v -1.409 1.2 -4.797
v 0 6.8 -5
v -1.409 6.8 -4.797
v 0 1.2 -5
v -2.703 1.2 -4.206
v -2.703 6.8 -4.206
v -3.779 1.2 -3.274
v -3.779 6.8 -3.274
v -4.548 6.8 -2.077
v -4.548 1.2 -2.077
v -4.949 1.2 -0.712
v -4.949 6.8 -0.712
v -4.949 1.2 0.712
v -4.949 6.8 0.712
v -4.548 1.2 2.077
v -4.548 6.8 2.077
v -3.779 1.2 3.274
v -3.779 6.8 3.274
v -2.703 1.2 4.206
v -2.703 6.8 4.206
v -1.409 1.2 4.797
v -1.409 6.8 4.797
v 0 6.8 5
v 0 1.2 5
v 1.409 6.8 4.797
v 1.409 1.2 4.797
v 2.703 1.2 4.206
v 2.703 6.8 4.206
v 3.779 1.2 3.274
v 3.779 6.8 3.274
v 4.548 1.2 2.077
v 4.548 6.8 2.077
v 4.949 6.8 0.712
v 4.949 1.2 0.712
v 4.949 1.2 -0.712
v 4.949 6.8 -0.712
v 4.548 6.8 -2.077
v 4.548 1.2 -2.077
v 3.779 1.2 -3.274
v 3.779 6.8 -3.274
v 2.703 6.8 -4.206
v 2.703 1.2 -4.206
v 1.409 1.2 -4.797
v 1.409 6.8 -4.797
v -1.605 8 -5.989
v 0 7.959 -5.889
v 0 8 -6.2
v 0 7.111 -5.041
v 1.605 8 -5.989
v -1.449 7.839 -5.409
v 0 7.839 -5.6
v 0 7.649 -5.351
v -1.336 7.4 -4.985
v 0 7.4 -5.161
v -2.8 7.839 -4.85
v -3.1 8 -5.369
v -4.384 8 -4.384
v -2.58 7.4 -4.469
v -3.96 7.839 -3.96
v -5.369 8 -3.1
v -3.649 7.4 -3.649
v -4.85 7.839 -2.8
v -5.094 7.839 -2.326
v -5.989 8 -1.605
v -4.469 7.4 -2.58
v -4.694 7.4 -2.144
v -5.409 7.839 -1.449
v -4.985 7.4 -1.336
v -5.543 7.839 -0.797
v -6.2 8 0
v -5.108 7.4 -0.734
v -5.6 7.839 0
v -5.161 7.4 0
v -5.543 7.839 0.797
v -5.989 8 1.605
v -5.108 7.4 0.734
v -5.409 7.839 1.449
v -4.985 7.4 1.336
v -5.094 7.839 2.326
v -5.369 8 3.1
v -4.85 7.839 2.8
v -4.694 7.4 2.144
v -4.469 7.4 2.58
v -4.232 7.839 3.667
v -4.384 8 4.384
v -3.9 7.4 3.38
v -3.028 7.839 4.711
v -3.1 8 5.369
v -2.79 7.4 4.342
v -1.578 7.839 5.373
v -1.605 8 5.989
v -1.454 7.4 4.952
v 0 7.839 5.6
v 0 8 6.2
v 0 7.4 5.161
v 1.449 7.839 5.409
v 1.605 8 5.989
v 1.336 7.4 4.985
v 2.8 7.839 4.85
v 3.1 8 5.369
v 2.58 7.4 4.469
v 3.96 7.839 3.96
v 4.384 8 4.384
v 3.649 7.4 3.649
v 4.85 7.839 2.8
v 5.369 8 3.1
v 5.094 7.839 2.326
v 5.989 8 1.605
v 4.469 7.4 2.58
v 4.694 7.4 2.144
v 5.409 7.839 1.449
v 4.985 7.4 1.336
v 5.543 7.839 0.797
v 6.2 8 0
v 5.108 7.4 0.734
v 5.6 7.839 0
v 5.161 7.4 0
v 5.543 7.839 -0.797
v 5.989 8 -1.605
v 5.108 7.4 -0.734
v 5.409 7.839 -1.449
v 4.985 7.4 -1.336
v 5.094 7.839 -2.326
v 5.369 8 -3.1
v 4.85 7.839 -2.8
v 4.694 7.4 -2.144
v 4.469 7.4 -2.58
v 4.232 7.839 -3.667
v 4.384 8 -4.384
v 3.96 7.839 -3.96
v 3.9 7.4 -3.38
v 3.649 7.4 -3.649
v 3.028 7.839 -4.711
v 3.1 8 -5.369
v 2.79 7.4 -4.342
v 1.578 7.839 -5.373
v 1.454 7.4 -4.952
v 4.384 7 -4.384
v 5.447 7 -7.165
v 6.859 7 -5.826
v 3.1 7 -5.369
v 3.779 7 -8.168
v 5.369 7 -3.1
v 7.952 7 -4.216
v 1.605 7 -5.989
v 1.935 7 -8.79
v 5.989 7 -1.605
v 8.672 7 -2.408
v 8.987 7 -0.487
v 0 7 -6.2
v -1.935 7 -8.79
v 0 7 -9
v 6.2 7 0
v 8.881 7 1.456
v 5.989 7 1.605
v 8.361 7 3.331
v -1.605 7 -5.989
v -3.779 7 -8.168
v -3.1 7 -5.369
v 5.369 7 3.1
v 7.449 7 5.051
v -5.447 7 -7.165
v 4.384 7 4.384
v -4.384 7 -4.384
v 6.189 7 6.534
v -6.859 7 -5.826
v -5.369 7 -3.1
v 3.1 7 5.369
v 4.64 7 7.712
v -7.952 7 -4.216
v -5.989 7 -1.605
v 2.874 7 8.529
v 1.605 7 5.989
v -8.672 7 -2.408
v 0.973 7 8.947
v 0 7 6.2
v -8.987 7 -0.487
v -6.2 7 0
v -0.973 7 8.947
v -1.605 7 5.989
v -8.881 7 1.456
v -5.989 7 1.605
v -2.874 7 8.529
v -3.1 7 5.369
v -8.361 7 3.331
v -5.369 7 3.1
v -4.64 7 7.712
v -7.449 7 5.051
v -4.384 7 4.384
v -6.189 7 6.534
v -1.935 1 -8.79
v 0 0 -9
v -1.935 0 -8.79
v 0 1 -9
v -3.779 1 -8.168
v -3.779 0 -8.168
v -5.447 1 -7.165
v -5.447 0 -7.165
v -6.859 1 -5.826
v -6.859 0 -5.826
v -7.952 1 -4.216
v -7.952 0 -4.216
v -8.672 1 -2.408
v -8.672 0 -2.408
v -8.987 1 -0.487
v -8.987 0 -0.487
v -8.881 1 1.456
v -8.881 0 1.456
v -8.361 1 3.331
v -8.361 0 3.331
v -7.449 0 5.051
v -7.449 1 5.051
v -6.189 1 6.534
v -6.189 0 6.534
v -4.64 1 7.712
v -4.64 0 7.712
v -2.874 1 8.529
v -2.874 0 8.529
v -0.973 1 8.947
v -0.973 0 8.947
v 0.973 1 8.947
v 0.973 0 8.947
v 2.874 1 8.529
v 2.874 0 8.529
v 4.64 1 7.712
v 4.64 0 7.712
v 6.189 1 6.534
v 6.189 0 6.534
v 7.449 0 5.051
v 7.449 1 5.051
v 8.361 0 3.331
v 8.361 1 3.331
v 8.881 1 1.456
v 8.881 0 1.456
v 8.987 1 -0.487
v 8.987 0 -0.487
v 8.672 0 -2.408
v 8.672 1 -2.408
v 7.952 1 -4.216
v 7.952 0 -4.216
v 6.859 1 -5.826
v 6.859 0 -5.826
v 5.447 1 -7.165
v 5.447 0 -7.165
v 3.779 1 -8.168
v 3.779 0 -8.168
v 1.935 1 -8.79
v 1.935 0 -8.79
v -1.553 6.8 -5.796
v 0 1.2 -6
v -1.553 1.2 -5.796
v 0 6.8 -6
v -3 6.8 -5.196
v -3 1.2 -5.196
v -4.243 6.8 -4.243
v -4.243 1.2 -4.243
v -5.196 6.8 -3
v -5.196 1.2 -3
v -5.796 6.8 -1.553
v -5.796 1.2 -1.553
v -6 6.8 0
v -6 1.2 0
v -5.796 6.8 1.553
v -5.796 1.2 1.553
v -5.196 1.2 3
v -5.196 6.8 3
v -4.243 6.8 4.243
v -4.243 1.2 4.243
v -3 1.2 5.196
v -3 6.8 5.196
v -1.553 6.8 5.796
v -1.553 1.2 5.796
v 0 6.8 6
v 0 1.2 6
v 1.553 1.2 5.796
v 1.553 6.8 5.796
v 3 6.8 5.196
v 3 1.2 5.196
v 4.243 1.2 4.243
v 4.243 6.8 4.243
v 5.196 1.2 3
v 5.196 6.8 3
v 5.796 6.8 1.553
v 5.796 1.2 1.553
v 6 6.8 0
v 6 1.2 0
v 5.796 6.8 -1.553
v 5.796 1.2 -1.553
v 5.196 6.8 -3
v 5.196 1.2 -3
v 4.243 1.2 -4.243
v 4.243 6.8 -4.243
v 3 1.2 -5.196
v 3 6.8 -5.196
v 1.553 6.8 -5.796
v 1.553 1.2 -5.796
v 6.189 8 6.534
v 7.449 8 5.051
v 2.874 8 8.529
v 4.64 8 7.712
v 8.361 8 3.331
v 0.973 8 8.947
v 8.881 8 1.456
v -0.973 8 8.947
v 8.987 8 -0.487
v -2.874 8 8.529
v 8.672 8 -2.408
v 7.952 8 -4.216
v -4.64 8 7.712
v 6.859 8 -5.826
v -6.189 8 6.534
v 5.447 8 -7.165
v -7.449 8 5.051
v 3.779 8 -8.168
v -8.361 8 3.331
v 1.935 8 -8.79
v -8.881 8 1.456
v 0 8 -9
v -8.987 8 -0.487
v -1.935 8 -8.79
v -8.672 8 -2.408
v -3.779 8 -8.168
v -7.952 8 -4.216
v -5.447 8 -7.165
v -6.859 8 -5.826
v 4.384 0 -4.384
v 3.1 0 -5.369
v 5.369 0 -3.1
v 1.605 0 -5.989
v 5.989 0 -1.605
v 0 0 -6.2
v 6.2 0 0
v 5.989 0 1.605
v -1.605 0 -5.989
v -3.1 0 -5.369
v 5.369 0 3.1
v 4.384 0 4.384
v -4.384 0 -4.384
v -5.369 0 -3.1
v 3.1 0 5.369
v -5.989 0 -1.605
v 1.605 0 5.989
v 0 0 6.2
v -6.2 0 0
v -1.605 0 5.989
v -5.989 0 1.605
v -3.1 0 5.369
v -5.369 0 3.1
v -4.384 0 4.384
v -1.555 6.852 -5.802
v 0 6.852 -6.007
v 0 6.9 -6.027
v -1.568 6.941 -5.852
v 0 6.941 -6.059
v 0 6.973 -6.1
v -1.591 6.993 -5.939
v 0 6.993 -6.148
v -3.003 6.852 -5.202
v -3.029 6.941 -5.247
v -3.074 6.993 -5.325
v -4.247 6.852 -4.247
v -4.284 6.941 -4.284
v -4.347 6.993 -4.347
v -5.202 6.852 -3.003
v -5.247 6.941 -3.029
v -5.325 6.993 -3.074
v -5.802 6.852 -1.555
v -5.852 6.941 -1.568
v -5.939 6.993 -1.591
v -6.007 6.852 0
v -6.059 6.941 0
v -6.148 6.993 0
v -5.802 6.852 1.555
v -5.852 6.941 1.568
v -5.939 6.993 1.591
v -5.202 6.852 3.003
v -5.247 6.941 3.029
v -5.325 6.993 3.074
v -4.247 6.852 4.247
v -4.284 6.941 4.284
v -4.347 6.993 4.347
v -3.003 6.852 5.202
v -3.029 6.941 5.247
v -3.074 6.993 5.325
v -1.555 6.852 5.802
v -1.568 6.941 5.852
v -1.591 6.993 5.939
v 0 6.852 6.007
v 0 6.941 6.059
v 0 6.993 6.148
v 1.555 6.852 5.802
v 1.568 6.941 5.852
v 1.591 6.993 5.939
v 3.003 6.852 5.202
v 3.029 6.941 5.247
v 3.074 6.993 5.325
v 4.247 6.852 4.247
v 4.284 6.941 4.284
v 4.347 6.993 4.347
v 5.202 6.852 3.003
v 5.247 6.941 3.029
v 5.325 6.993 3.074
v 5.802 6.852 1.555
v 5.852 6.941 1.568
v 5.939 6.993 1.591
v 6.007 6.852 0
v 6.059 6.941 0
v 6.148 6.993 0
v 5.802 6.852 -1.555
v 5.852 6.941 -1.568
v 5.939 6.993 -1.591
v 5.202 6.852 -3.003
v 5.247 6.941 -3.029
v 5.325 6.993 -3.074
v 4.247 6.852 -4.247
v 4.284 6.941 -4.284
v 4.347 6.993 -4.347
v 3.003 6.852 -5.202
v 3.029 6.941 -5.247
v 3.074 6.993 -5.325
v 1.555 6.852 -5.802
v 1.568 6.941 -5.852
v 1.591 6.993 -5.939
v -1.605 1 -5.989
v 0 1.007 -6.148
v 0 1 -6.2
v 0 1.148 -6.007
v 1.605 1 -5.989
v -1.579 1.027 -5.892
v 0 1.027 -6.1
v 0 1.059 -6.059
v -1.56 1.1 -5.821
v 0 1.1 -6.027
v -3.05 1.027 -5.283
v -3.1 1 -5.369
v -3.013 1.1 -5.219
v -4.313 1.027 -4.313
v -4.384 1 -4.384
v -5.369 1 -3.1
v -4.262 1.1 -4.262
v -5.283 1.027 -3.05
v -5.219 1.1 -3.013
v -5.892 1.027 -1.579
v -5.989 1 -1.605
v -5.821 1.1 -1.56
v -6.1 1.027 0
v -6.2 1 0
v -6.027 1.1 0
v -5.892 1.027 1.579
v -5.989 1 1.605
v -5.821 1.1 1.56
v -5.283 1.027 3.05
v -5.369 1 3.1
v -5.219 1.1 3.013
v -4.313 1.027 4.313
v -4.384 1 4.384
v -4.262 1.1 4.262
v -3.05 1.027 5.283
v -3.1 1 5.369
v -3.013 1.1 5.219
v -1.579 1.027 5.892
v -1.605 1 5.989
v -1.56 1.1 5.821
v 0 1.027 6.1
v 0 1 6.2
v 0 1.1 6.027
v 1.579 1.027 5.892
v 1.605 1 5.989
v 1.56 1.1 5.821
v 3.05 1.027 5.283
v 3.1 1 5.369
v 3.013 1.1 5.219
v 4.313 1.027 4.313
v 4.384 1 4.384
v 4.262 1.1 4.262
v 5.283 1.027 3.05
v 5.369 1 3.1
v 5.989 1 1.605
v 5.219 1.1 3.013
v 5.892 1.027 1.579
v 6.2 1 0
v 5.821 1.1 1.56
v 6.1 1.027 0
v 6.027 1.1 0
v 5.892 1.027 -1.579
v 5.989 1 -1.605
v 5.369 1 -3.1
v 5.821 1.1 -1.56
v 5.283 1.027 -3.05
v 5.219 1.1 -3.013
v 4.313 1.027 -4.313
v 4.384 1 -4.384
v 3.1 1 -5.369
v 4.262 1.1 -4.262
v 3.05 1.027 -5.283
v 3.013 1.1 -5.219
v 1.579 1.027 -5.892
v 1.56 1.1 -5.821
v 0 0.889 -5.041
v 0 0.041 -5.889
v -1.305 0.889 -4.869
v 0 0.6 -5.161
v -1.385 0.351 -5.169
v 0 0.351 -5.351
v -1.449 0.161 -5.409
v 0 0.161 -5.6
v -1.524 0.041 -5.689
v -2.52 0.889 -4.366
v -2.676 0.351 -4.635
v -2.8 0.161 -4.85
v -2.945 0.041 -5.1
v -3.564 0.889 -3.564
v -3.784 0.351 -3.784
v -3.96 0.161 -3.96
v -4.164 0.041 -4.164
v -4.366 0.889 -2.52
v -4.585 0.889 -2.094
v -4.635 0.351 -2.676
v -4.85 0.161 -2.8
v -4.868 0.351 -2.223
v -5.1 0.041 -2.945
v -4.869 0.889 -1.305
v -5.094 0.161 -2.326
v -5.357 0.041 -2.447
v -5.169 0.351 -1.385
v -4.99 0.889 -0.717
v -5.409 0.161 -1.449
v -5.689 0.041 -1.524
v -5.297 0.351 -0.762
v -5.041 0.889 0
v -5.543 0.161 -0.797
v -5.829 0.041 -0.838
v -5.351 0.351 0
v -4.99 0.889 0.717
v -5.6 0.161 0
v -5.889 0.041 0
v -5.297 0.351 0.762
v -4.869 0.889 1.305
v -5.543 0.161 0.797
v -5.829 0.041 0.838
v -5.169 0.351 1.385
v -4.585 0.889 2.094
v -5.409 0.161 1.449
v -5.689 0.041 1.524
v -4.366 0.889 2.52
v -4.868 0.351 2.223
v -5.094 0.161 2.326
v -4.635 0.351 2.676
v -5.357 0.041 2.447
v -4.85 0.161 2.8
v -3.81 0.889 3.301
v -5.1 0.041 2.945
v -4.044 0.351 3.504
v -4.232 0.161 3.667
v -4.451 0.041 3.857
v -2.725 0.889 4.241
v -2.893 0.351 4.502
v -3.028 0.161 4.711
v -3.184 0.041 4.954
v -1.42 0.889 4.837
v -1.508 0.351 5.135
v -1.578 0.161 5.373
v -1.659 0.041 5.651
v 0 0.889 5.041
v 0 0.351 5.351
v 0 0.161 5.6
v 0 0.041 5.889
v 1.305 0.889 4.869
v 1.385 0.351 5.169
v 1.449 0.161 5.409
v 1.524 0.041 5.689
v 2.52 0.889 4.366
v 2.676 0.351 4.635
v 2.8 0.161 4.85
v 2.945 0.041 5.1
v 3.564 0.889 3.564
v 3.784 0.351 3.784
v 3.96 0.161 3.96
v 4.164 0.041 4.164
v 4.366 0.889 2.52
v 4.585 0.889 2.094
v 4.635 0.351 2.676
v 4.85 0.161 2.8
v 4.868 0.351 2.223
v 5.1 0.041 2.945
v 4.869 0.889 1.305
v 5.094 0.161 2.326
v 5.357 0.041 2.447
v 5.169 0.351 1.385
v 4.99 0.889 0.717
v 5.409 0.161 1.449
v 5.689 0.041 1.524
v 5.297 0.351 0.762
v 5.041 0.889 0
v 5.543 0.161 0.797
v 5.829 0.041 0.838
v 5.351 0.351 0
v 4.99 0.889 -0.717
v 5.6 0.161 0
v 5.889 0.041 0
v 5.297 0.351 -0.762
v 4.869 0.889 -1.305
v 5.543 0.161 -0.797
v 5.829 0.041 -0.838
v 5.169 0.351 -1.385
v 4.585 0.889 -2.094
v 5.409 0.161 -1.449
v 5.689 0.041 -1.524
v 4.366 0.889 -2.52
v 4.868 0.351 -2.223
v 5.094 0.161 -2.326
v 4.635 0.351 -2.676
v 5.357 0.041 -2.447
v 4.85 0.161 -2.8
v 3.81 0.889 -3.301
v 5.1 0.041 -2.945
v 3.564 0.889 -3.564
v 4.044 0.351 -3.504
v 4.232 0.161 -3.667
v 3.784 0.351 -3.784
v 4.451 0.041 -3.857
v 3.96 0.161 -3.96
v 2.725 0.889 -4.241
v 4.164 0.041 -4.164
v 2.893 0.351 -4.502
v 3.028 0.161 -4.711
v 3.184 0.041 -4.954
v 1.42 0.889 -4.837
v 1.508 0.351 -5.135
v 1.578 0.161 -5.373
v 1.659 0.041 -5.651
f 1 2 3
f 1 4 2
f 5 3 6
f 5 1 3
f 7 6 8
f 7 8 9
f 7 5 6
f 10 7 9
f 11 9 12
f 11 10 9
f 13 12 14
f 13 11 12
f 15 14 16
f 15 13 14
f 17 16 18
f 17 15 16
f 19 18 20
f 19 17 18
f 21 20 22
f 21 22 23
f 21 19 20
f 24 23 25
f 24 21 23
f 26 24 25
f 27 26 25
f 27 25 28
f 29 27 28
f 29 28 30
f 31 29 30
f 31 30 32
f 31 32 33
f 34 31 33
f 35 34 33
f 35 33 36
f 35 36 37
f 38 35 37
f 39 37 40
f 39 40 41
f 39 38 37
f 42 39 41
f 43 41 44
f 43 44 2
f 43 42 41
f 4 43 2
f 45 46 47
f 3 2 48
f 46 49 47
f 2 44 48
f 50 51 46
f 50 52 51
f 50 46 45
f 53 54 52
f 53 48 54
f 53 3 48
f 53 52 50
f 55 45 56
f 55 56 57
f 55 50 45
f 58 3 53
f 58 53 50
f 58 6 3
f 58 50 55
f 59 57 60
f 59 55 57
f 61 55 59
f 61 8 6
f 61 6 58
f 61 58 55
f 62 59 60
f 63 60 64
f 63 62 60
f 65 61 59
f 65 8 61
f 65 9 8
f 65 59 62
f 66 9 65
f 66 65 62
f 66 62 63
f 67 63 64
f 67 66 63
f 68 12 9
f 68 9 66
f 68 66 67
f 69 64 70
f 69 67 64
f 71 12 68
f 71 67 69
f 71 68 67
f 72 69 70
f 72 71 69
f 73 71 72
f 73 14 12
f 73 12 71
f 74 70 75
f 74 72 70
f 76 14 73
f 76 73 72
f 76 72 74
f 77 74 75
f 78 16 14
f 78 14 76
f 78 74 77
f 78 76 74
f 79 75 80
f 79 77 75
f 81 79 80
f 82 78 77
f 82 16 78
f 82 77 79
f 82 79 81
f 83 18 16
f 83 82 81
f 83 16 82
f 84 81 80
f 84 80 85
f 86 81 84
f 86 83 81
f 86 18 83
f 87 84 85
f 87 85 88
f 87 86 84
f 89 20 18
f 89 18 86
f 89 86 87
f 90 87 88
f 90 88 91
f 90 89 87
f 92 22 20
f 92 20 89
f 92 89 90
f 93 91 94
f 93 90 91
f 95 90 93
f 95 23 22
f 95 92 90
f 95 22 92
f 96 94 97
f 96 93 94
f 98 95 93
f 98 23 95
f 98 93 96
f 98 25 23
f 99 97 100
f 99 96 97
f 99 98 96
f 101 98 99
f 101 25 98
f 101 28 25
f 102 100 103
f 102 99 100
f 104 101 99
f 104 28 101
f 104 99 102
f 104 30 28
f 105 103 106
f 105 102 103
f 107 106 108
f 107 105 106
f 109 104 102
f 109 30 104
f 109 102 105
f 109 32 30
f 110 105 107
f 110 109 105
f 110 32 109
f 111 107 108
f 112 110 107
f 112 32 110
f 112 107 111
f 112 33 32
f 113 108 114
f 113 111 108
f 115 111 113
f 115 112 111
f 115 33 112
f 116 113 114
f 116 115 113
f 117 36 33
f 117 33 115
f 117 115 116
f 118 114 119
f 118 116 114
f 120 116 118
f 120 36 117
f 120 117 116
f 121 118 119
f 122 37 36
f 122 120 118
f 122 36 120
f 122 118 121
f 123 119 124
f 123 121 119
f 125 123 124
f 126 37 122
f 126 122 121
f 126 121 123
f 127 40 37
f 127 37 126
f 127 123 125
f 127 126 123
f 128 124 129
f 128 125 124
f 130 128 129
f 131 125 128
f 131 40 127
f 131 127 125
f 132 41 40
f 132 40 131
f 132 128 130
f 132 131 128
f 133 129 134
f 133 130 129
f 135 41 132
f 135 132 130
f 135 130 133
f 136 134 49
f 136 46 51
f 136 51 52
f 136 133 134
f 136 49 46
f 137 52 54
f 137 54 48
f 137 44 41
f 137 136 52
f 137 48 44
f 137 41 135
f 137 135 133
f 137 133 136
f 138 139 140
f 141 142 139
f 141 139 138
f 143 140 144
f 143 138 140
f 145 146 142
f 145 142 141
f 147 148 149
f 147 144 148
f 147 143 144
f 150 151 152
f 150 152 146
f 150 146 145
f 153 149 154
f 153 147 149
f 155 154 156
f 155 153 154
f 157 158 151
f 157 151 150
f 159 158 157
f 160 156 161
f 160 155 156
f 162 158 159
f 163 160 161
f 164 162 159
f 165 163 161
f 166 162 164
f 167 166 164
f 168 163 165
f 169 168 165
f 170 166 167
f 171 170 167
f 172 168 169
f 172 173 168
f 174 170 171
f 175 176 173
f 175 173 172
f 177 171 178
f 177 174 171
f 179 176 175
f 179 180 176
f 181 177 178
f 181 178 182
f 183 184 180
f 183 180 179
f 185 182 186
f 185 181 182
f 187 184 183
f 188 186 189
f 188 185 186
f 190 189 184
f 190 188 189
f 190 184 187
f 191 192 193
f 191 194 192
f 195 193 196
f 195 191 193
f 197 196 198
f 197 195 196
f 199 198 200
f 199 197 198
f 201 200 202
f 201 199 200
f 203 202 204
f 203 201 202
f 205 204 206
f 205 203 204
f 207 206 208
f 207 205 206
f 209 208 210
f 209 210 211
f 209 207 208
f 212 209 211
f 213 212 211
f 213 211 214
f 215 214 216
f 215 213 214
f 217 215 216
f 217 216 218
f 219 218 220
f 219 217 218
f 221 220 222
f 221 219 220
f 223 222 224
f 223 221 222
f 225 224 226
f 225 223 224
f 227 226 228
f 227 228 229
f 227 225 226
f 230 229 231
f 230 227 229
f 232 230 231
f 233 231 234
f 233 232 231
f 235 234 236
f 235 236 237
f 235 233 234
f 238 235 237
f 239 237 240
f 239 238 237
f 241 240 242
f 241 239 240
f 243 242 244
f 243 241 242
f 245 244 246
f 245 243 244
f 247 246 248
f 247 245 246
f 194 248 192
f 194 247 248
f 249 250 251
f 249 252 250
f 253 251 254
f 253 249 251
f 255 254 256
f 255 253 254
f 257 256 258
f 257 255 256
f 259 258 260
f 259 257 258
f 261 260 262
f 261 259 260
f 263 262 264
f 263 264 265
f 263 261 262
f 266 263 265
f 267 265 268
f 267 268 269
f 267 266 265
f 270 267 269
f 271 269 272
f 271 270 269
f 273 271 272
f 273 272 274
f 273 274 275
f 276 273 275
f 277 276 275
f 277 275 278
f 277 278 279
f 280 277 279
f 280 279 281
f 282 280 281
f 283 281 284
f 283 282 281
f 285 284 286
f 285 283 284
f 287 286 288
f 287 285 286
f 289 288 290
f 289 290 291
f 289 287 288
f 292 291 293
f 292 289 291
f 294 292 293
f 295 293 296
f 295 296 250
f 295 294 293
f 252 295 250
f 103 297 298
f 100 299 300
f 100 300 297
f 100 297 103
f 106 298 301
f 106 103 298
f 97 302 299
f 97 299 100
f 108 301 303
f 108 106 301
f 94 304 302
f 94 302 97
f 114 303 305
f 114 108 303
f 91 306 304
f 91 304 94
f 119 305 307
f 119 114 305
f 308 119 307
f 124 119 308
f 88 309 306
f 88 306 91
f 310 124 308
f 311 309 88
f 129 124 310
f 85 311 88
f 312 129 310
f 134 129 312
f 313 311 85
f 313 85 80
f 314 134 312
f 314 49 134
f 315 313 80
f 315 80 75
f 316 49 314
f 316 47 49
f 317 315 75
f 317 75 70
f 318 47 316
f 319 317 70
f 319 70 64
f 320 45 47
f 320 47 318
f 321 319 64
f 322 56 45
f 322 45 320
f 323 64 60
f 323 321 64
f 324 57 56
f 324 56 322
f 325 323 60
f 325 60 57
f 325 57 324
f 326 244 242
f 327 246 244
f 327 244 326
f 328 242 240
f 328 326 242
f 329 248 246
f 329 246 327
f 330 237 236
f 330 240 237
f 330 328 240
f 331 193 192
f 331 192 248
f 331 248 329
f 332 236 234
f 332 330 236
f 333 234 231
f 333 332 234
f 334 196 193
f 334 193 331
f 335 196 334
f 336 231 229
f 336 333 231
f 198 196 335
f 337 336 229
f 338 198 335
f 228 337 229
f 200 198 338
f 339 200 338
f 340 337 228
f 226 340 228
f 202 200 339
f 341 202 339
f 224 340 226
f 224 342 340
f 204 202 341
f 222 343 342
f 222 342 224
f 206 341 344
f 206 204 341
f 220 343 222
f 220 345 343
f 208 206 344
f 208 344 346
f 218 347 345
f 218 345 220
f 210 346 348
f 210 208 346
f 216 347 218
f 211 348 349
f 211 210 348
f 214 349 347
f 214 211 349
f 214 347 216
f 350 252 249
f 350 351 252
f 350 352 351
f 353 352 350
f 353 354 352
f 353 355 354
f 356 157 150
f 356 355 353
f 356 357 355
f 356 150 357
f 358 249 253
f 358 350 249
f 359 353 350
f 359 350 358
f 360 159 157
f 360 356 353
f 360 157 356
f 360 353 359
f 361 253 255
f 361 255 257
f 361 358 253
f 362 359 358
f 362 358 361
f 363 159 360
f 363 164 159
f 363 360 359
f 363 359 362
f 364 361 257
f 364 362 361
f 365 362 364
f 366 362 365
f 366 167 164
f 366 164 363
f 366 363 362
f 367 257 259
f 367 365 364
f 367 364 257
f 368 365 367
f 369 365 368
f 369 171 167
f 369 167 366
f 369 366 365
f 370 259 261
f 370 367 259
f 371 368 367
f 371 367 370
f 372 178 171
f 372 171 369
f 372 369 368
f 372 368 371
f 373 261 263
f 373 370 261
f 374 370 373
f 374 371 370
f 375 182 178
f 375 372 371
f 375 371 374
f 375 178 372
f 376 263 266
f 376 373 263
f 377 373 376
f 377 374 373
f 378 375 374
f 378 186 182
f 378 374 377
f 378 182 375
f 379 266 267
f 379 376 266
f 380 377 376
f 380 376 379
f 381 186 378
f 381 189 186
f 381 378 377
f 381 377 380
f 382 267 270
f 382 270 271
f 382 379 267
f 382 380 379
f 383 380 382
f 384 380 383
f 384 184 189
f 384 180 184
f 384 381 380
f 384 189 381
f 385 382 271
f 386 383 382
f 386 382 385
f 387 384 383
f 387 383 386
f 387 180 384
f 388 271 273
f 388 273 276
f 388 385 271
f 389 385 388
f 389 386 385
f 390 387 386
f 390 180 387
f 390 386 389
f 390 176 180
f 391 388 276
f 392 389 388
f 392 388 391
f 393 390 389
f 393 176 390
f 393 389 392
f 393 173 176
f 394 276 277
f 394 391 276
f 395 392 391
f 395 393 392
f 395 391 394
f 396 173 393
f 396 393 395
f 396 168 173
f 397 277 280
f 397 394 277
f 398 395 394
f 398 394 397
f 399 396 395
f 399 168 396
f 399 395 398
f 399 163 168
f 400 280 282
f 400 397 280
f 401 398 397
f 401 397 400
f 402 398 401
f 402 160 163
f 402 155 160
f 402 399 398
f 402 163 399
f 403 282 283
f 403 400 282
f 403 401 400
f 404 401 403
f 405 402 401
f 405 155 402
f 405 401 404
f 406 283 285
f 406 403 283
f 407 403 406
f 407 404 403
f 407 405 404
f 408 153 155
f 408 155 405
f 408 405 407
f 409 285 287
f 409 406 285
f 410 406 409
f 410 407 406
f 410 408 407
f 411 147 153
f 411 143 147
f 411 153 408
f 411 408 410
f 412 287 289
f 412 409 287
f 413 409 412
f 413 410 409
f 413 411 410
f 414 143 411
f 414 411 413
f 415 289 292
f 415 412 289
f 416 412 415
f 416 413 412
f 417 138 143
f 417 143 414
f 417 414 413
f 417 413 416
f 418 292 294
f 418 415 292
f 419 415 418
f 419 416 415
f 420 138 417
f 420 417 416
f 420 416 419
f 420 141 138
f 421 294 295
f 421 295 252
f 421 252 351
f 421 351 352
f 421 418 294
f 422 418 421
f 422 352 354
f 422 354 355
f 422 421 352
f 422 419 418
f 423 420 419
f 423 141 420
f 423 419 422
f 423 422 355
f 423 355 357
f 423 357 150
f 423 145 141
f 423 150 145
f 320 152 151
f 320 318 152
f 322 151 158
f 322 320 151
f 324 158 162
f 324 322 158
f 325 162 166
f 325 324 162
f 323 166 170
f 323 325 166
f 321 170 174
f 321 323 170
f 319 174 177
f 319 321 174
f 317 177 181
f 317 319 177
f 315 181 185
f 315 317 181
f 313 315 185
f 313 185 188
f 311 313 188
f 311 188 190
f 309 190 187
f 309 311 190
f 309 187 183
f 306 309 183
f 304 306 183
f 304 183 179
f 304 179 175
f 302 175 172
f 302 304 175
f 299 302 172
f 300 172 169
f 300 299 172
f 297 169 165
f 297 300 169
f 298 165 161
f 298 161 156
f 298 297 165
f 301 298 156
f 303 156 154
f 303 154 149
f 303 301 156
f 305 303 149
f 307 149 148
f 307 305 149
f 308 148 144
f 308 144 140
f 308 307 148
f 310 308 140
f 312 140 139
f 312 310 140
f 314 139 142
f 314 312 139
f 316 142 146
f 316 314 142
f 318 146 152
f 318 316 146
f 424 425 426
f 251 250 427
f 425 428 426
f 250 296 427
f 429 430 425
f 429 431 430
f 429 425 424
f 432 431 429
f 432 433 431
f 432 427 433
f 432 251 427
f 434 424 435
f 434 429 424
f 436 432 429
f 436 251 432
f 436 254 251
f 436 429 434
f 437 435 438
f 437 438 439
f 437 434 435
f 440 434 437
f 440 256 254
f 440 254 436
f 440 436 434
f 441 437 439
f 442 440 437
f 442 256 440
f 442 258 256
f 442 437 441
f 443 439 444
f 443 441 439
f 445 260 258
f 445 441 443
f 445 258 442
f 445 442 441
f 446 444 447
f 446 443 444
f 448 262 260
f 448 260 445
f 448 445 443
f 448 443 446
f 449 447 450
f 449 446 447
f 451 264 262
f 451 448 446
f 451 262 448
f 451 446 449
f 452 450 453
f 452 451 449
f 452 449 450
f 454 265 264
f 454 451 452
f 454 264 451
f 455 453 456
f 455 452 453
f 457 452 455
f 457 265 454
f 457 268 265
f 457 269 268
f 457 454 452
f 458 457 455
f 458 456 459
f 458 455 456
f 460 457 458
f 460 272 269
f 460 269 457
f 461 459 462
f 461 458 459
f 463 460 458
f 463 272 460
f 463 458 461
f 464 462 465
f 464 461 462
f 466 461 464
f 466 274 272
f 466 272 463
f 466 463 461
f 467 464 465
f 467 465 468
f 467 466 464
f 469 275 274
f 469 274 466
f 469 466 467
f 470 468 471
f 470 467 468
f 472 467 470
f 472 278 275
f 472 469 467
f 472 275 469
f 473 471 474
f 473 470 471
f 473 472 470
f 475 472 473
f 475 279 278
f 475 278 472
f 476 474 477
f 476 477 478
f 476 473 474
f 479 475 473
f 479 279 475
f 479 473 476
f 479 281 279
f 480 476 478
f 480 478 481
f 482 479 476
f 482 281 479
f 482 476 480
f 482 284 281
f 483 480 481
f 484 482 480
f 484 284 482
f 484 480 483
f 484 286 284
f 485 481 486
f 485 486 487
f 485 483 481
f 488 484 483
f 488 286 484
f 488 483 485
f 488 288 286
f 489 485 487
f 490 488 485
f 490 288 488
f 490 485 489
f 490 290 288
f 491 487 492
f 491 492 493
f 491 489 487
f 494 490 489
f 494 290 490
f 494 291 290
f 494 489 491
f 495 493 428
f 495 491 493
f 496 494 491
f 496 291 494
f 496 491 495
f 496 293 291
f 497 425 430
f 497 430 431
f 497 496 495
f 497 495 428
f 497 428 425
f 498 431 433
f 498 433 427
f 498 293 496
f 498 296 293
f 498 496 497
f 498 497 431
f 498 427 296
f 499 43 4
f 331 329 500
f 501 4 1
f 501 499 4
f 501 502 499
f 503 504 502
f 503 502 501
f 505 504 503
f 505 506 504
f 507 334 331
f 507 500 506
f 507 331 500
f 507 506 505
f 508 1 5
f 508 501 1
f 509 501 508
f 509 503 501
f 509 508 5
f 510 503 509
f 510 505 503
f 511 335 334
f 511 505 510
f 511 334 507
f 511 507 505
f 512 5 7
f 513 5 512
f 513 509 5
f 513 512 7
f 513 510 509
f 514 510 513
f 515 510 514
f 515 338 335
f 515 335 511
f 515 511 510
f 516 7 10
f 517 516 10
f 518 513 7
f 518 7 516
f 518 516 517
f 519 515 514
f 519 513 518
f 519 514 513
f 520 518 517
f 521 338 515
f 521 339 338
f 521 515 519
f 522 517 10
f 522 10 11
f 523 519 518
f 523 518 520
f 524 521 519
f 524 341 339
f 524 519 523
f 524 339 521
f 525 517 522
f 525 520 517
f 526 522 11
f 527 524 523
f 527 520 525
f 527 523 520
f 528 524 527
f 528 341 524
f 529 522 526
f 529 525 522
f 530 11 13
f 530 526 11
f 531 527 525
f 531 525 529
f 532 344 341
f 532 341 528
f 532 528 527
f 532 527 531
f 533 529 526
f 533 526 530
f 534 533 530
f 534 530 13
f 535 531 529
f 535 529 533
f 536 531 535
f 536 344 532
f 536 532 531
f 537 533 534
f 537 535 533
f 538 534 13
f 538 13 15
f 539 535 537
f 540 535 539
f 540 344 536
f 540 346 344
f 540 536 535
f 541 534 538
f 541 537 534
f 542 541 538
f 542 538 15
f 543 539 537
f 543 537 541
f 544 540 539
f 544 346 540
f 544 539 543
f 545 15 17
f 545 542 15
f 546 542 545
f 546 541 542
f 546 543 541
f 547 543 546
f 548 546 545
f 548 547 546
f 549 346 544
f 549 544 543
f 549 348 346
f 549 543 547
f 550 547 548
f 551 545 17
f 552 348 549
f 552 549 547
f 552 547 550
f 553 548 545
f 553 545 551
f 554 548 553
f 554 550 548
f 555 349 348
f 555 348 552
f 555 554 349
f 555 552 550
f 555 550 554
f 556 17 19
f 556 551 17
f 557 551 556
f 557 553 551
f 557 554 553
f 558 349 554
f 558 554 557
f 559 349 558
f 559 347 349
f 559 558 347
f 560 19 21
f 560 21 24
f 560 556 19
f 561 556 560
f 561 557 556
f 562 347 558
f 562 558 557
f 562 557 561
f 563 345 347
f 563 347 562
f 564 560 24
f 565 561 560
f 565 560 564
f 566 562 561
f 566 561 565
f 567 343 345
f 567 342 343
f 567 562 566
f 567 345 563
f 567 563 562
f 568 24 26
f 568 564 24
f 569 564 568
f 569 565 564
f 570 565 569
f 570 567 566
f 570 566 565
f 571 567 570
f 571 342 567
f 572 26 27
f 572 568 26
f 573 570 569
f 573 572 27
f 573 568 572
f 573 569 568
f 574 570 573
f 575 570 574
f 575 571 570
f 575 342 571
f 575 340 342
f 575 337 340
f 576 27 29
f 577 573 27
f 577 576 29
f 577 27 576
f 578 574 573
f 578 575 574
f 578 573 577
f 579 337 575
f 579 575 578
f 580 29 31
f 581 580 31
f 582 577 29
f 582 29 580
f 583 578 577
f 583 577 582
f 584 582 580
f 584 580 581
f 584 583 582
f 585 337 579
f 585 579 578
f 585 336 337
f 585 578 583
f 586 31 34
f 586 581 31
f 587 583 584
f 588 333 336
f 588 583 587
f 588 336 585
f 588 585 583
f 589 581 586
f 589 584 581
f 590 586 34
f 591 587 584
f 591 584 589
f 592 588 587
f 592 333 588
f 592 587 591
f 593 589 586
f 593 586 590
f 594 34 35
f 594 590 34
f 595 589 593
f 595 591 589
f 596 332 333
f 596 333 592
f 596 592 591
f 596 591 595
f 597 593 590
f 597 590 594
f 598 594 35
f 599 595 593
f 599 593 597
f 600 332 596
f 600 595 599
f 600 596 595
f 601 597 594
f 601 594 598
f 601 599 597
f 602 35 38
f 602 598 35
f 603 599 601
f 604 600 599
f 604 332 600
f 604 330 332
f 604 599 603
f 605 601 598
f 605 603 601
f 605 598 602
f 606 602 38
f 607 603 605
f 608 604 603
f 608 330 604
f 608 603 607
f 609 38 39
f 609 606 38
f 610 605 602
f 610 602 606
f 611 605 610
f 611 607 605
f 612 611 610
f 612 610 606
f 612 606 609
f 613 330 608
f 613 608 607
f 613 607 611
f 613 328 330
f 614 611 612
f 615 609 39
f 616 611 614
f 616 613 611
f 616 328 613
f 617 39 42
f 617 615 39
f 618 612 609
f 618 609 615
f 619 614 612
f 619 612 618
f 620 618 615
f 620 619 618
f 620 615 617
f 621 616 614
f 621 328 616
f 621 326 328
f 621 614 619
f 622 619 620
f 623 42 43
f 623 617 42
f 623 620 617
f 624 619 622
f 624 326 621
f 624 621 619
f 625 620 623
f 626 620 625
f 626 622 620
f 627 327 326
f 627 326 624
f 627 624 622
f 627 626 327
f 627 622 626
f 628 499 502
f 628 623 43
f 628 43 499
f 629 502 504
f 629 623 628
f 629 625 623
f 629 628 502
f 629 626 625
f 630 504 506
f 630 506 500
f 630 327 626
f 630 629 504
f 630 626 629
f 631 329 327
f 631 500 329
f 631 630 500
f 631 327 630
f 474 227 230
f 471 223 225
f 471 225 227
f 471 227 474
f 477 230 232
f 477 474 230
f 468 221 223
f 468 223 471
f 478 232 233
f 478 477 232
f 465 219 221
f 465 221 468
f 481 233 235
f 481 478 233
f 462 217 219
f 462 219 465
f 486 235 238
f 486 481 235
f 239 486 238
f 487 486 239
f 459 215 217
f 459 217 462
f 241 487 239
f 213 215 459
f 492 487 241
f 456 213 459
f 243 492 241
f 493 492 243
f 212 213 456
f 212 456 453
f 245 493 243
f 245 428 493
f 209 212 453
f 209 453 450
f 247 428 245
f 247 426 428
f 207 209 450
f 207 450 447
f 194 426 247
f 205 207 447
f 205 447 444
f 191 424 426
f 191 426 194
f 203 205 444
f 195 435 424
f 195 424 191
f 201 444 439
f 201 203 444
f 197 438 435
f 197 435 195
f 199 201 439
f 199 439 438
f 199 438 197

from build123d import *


with BuildPart() as part:
    # Esquisse1 → Base-Révolution (revolve)
    with BuildSketch(Plane.XY, mode=Mode.PRIVATE) as base_r_volution_sk:
        with BuildLine():
            Line((6.2, 0), (9, 0))
            Line((9, 0), (9, 1))
            Line((9, 1), (6.2, 1))
            ThreePointArc((6.2, 1), (6.058578644, 1.058578644), (6, 1.2))
            Line((6, 1.2), (6, 6.8))
            ThreePointArc((6, 6.8), (6.058578644, 6.941421356), (6.2, 7))
            Line((6.2, 7), (9, 7))
            Line((9, 7), (9, 8))
            Line((9, 8), (6.2, 8))
            ThreePointArc((6.2, 8), (5.351471863, 7.648528137), (5, 6.8))
            Line((5, 6.8), (5, 1.2))
            ThreePointArc((5, 1.2), (5.351471863, 0.351471863), (6.2, 0))
        make_face()
    revolve(base_r_volution_sk.sketch.rotate(Axis((0, 0, 0), (0, 1, 0)), 90), axis=Axis((0, 0, 0), (0, 1, 0)))


solid = part.part
